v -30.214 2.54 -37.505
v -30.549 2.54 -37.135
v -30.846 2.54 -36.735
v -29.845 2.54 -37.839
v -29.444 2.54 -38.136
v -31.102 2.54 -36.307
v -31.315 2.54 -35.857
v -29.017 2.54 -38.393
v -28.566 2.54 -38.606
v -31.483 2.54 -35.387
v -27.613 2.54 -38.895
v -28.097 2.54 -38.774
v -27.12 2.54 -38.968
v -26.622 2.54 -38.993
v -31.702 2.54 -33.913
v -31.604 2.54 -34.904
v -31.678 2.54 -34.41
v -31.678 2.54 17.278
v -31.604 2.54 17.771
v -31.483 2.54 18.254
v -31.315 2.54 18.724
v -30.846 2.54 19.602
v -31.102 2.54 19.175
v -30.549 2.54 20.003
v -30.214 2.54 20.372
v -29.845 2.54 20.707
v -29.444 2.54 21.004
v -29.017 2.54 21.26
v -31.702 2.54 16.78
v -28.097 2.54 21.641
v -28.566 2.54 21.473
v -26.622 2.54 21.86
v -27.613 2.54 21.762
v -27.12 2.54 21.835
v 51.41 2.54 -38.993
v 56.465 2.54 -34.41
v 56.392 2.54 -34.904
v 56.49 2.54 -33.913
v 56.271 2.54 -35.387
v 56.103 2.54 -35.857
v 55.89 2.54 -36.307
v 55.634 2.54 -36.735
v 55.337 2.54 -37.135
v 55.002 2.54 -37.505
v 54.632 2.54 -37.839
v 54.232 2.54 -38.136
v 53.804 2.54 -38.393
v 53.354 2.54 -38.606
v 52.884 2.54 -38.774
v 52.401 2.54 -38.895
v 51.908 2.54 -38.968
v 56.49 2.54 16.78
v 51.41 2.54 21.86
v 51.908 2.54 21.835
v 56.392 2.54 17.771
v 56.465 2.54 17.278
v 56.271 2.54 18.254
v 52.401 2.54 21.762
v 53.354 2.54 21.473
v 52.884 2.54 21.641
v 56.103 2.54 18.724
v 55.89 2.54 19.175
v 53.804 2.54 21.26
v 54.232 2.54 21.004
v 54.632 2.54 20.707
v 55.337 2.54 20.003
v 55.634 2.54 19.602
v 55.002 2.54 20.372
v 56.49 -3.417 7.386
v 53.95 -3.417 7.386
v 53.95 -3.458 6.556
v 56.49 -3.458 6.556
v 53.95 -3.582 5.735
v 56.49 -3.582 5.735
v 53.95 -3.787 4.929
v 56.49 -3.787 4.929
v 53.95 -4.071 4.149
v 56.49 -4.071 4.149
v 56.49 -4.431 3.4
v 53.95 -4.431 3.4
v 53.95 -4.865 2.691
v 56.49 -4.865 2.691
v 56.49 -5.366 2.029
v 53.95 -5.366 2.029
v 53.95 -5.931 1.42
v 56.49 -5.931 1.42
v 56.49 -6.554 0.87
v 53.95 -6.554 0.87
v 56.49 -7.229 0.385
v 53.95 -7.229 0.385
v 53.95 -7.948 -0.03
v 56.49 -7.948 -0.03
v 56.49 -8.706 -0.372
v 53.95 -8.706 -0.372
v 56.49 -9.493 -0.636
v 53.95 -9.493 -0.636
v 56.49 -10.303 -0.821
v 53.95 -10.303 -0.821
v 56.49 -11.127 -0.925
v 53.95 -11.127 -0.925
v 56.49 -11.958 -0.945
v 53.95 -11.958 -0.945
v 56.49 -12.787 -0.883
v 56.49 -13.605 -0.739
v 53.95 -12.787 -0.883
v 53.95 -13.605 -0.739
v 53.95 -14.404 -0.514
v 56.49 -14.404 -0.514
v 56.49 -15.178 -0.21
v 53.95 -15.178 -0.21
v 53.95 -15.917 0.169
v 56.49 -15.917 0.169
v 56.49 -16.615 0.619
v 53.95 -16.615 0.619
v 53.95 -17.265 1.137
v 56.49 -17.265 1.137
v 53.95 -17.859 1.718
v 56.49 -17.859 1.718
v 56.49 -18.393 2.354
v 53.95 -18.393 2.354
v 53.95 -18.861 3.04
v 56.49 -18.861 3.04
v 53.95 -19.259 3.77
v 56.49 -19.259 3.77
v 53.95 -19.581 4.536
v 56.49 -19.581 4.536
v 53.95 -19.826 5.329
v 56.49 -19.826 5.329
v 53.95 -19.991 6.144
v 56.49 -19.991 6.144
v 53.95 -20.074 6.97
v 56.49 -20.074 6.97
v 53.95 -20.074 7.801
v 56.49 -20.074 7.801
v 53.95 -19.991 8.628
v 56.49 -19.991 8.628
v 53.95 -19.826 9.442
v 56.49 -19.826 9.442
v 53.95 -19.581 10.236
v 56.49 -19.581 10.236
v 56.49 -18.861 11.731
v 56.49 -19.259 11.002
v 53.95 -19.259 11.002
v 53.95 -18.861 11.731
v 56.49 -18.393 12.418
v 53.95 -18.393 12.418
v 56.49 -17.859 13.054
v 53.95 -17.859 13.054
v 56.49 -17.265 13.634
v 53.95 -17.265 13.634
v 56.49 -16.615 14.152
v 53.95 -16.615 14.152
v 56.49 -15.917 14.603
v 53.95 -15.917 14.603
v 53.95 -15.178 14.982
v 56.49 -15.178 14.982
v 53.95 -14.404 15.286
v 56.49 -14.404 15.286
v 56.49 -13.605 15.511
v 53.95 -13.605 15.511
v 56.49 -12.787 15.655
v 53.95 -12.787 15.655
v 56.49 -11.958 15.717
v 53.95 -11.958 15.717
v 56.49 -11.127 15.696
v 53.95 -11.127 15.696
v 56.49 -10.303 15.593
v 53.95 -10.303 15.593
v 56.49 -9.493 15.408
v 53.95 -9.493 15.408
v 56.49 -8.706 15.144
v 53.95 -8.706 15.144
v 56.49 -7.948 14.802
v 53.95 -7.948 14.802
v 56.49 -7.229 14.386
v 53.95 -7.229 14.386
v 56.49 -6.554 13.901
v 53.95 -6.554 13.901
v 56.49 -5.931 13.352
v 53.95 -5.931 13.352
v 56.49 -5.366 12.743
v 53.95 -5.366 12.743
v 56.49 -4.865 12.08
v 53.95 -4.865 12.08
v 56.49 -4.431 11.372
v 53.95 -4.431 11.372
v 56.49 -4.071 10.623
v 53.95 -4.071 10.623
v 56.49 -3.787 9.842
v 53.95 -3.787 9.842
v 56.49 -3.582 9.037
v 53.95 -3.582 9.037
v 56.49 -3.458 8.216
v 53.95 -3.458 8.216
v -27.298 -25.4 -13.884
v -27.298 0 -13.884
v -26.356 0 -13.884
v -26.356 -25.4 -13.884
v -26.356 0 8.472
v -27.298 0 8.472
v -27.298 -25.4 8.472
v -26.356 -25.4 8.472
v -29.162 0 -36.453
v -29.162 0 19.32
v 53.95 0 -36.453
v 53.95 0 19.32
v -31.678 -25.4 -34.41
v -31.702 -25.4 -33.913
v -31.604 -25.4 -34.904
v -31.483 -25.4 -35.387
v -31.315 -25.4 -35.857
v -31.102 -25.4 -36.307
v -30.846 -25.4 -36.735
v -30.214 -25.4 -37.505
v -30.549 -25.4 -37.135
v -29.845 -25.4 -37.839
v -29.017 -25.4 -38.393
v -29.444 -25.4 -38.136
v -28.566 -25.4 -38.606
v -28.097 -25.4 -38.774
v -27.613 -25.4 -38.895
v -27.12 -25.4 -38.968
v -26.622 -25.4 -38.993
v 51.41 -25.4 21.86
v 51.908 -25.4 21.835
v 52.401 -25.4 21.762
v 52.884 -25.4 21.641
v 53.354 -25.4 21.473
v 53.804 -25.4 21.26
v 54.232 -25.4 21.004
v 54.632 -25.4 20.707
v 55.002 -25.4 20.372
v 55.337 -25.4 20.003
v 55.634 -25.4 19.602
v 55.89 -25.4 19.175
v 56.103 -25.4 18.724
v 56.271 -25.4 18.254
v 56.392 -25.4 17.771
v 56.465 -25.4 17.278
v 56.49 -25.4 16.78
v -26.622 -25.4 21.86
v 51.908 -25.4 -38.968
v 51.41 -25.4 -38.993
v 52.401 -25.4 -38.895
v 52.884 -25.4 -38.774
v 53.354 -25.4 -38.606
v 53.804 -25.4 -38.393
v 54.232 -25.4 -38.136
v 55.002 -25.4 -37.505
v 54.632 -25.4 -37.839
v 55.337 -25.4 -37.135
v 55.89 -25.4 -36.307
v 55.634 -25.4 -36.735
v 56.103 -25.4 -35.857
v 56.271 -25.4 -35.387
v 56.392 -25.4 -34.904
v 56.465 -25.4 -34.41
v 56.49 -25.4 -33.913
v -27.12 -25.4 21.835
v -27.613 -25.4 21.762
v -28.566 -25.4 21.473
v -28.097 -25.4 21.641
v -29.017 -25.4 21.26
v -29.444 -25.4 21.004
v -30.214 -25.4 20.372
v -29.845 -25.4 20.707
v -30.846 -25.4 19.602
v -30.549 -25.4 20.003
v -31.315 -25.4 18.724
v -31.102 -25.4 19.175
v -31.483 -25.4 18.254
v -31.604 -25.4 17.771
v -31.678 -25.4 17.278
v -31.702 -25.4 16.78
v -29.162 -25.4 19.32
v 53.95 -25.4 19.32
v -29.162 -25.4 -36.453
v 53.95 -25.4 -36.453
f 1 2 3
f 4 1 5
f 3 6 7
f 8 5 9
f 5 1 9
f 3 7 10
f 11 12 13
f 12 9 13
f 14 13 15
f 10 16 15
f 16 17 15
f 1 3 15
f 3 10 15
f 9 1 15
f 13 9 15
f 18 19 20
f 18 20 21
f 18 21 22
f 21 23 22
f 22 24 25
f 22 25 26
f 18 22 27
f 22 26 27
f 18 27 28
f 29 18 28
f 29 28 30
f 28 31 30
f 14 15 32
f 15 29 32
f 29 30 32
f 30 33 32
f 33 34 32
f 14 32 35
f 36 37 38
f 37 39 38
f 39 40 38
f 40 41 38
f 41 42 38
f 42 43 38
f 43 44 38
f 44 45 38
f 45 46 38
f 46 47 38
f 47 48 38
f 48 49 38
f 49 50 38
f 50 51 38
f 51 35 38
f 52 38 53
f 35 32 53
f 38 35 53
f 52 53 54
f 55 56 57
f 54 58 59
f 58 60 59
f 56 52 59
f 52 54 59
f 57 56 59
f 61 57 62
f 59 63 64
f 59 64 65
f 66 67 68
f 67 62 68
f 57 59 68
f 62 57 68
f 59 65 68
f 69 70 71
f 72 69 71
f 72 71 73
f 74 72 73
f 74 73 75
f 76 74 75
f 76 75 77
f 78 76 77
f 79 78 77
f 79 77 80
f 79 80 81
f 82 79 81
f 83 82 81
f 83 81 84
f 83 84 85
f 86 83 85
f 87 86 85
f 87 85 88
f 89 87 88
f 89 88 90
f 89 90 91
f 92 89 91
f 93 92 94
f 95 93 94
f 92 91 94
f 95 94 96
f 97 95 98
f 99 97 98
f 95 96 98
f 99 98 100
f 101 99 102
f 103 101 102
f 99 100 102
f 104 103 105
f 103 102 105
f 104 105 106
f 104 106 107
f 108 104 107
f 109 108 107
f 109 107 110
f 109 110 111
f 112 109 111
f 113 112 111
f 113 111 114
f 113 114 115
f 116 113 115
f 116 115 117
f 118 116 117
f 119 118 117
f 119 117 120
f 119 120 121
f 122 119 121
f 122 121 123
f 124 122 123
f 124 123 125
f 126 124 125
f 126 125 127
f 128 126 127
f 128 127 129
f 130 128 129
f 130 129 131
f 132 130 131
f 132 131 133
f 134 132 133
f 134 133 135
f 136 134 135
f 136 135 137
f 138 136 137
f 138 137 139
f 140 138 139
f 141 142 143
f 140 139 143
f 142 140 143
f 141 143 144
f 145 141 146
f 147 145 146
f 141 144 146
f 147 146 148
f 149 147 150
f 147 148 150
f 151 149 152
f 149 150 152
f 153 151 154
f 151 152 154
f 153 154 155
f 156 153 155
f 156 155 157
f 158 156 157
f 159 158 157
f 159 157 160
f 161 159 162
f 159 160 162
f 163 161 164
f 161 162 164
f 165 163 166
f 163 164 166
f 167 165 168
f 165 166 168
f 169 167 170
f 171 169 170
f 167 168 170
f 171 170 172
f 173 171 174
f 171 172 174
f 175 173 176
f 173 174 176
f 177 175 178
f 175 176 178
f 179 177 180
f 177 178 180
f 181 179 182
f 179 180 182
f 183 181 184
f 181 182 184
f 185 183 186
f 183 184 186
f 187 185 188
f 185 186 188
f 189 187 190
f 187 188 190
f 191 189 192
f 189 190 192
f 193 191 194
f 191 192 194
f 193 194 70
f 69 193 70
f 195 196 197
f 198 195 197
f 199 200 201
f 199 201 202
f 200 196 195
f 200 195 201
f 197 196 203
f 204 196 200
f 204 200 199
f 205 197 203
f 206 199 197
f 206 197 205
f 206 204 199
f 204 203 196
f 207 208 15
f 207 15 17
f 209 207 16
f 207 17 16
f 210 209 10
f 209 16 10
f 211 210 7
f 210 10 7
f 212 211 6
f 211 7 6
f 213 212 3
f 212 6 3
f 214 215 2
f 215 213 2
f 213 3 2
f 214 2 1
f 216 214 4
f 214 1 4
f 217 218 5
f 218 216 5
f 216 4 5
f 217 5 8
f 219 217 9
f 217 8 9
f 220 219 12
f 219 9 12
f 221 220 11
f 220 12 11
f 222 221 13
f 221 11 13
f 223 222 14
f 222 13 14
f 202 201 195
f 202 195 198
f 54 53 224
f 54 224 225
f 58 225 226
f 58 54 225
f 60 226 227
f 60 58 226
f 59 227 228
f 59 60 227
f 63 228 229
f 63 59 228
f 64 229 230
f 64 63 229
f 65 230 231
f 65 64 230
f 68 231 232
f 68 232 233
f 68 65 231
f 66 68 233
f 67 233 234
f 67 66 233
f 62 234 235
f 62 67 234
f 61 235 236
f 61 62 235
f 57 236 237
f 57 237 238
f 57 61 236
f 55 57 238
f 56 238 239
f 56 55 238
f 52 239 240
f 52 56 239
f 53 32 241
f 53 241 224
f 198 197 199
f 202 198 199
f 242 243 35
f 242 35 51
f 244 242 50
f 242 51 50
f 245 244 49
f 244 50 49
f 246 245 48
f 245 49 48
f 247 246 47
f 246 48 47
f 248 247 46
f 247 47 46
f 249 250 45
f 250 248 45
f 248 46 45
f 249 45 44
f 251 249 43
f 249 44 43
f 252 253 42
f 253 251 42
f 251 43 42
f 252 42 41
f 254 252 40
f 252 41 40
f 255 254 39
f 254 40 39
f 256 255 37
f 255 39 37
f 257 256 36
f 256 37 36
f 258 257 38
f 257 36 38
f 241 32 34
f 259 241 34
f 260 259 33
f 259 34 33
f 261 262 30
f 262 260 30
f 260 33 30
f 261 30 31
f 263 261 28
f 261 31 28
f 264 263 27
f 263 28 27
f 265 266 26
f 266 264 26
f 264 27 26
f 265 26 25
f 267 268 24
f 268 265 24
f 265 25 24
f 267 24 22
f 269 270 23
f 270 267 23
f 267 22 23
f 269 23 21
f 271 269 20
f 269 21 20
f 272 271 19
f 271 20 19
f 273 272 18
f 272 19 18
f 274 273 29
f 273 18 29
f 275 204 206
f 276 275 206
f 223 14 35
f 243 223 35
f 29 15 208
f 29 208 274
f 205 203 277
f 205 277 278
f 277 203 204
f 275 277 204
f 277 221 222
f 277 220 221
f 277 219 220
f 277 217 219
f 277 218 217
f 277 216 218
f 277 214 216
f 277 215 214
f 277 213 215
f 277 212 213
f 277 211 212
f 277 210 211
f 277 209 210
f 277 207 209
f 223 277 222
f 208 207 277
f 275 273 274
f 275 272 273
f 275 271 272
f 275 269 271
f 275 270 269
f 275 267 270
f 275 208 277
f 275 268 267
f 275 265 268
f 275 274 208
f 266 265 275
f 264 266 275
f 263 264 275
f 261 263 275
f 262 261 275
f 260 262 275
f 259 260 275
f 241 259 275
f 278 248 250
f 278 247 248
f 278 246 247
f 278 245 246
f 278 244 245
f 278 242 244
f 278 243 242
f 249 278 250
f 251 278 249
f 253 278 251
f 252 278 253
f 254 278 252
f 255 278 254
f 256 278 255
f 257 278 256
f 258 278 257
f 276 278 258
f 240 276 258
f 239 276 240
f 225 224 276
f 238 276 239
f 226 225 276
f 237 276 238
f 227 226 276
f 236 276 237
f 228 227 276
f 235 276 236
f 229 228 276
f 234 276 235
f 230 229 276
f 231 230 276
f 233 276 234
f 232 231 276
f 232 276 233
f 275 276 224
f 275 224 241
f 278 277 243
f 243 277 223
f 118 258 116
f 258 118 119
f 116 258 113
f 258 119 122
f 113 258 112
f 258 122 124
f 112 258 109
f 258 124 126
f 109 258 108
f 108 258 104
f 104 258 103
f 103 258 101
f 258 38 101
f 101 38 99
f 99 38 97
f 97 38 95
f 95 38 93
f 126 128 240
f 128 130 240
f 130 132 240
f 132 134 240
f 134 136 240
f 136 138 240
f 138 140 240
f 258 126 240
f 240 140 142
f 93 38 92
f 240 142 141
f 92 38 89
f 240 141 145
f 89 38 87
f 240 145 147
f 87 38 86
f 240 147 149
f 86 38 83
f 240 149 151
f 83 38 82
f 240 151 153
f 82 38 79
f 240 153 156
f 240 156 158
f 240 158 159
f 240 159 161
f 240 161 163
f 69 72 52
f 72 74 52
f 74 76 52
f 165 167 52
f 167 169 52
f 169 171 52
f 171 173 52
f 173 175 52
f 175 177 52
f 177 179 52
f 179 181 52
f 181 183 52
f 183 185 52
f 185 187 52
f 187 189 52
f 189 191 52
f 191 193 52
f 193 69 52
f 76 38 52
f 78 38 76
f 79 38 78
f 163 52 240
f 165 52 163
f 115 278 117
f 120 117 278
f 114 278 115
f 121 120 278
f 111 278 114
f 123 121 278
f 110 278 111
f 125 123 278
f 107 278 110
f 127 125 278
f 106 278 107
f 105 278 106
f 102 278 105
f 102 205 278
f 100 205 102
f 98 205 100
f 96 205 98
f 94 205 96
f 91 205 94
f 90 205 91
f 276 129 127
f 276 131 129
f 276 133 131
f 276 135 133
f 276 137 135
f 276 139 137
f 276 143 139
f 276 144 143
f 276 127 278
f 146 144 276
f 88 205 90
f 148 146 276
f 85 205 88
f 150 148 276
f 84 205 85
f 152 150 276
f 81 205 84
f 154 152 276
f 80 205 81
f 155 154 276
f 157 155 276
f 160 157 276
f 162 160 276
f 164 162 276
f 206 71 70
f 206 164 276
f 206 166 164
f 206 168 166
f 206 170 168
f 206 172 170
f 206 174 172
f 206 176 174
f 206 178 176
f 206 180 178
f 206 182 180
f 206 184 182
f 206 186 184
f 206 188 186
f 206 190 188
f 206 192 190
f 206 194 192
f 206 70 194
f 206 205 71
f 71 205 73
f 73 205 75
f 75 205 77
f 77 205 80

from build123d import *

# Parameters (mm, degrees)
F0_W        = 83.1117276102
F0_H        = 55.7723436505
F1_DEPTH    = 25.4
F2_T        = 2.54
F3_T1_DEPTH = 53.34
F5_D        = 16.66748
F5_DEPTH    = 56.4907174323
F6_W        = 0.9412951767
F6_H        = 22.3557362333
F7_DEPTH    = 25.4


# Not quite as in the source:
# - a fillet or chamfer that OpenCascade refuses, or shapes differently, is made with other operations: its cross-section is extruded or revolved along the edge and cut away or added


with BuildPart() as f1:
    # F0 (on Front) → F1 (new body)
    with BuildSketch(Plane.XZ):
        with Locations((12.3938536271, -8.5663376376)):
            Rectangle(F0_W, F0_H)
    extrude(amount=F1_DEPTH)

    # F2
    f2_openings = [f1.faces().sort_by_distance(p)[0] for p in [
        (12.393854, -25.4, -8.566338),
    ]]
    offset(amount=F2_T, openings=f2_openings, kind=Kind.INTERSECTION)

    # F3: fillet of radius 5.08 on 4 edges, made by hand

    # F3_s2 → F3_t1 (cut)
    with BuildSketch(Plane.XZ.offset(-15.24)):
        with BuildLine():
            ThreePointArc((51.4097174323, 21.8598341876), (55.0018198807, 20.3719366361), (56.4897174323, 16.7798341876))
            Line((56.4897174323, 16.7798341876), (56.4897174323, 21.8598341876))
            Line((56.4897174323, 21.8598341876), (51.4097174323, 21.8598341876))
        make_face()
        with BuildLine():
            ThreePointArc((-26.622010178, 21.8598341876), (-30.2141126264, 20.3719366361), (-31.702010178, 16.7798341876))
            Line((-31.702010178, 16.7798341876), (-31.702010178, 21.8598341876))
            Line((-31.702010178, 21.8598341876), (-26.622010178, 21.8598341876))
        make_face()
        with BuildLine():
            ThreePointArc((-31.702010178, -33.9125094628), (-30.2141126264, -37.5046119113), (-26.622010178, -38.9925094628))
            Line((-26.622010178, -38.9925094628), (-31.702010178, -38.9925094628))
            Line((-31.702010178, -38.9925094628), (-31.702010178, -33.9125094628))
        make_face()
        with BuildLine():
            ThreePointArc((51.4097174323, -38.9925094628), (55.0018198807, -37.5046119113), (56.4897174323, -33.9125094628))
            Line((56.4897174323, -33.9125094628), (56.4897174323, -38.9925094628))
            Line((56.4897174323, -38.9925094628), (51.4097174323, -38.9925094628))
        make_face()
    extrude(amount=F3_T1_DEPTH, mode=Mode.SUBTRACT)

    # F5 (through all, one way)
    with BuildSketch(Plane(origin=(0, 0, 0), x_dir=(0, 1, 0), z_dir=(-1, 0, 0))):
        with Locations((-11.7502789944, -7.3858899996)):
            Circle(F5_D / 2)
    extrude(amount=-F5_DEPTH, mode=Mode.SUBTRACT)

    # F6 (on Front) → F7 (join)
    with BuildSketch(Plane.XZ):
        with Locations((-26.8268827349, -2.7062208392)):
            Rectangle(F6_W, F6_H)
    extrude(amount=F7_DEPTH)


solid = f1.part
